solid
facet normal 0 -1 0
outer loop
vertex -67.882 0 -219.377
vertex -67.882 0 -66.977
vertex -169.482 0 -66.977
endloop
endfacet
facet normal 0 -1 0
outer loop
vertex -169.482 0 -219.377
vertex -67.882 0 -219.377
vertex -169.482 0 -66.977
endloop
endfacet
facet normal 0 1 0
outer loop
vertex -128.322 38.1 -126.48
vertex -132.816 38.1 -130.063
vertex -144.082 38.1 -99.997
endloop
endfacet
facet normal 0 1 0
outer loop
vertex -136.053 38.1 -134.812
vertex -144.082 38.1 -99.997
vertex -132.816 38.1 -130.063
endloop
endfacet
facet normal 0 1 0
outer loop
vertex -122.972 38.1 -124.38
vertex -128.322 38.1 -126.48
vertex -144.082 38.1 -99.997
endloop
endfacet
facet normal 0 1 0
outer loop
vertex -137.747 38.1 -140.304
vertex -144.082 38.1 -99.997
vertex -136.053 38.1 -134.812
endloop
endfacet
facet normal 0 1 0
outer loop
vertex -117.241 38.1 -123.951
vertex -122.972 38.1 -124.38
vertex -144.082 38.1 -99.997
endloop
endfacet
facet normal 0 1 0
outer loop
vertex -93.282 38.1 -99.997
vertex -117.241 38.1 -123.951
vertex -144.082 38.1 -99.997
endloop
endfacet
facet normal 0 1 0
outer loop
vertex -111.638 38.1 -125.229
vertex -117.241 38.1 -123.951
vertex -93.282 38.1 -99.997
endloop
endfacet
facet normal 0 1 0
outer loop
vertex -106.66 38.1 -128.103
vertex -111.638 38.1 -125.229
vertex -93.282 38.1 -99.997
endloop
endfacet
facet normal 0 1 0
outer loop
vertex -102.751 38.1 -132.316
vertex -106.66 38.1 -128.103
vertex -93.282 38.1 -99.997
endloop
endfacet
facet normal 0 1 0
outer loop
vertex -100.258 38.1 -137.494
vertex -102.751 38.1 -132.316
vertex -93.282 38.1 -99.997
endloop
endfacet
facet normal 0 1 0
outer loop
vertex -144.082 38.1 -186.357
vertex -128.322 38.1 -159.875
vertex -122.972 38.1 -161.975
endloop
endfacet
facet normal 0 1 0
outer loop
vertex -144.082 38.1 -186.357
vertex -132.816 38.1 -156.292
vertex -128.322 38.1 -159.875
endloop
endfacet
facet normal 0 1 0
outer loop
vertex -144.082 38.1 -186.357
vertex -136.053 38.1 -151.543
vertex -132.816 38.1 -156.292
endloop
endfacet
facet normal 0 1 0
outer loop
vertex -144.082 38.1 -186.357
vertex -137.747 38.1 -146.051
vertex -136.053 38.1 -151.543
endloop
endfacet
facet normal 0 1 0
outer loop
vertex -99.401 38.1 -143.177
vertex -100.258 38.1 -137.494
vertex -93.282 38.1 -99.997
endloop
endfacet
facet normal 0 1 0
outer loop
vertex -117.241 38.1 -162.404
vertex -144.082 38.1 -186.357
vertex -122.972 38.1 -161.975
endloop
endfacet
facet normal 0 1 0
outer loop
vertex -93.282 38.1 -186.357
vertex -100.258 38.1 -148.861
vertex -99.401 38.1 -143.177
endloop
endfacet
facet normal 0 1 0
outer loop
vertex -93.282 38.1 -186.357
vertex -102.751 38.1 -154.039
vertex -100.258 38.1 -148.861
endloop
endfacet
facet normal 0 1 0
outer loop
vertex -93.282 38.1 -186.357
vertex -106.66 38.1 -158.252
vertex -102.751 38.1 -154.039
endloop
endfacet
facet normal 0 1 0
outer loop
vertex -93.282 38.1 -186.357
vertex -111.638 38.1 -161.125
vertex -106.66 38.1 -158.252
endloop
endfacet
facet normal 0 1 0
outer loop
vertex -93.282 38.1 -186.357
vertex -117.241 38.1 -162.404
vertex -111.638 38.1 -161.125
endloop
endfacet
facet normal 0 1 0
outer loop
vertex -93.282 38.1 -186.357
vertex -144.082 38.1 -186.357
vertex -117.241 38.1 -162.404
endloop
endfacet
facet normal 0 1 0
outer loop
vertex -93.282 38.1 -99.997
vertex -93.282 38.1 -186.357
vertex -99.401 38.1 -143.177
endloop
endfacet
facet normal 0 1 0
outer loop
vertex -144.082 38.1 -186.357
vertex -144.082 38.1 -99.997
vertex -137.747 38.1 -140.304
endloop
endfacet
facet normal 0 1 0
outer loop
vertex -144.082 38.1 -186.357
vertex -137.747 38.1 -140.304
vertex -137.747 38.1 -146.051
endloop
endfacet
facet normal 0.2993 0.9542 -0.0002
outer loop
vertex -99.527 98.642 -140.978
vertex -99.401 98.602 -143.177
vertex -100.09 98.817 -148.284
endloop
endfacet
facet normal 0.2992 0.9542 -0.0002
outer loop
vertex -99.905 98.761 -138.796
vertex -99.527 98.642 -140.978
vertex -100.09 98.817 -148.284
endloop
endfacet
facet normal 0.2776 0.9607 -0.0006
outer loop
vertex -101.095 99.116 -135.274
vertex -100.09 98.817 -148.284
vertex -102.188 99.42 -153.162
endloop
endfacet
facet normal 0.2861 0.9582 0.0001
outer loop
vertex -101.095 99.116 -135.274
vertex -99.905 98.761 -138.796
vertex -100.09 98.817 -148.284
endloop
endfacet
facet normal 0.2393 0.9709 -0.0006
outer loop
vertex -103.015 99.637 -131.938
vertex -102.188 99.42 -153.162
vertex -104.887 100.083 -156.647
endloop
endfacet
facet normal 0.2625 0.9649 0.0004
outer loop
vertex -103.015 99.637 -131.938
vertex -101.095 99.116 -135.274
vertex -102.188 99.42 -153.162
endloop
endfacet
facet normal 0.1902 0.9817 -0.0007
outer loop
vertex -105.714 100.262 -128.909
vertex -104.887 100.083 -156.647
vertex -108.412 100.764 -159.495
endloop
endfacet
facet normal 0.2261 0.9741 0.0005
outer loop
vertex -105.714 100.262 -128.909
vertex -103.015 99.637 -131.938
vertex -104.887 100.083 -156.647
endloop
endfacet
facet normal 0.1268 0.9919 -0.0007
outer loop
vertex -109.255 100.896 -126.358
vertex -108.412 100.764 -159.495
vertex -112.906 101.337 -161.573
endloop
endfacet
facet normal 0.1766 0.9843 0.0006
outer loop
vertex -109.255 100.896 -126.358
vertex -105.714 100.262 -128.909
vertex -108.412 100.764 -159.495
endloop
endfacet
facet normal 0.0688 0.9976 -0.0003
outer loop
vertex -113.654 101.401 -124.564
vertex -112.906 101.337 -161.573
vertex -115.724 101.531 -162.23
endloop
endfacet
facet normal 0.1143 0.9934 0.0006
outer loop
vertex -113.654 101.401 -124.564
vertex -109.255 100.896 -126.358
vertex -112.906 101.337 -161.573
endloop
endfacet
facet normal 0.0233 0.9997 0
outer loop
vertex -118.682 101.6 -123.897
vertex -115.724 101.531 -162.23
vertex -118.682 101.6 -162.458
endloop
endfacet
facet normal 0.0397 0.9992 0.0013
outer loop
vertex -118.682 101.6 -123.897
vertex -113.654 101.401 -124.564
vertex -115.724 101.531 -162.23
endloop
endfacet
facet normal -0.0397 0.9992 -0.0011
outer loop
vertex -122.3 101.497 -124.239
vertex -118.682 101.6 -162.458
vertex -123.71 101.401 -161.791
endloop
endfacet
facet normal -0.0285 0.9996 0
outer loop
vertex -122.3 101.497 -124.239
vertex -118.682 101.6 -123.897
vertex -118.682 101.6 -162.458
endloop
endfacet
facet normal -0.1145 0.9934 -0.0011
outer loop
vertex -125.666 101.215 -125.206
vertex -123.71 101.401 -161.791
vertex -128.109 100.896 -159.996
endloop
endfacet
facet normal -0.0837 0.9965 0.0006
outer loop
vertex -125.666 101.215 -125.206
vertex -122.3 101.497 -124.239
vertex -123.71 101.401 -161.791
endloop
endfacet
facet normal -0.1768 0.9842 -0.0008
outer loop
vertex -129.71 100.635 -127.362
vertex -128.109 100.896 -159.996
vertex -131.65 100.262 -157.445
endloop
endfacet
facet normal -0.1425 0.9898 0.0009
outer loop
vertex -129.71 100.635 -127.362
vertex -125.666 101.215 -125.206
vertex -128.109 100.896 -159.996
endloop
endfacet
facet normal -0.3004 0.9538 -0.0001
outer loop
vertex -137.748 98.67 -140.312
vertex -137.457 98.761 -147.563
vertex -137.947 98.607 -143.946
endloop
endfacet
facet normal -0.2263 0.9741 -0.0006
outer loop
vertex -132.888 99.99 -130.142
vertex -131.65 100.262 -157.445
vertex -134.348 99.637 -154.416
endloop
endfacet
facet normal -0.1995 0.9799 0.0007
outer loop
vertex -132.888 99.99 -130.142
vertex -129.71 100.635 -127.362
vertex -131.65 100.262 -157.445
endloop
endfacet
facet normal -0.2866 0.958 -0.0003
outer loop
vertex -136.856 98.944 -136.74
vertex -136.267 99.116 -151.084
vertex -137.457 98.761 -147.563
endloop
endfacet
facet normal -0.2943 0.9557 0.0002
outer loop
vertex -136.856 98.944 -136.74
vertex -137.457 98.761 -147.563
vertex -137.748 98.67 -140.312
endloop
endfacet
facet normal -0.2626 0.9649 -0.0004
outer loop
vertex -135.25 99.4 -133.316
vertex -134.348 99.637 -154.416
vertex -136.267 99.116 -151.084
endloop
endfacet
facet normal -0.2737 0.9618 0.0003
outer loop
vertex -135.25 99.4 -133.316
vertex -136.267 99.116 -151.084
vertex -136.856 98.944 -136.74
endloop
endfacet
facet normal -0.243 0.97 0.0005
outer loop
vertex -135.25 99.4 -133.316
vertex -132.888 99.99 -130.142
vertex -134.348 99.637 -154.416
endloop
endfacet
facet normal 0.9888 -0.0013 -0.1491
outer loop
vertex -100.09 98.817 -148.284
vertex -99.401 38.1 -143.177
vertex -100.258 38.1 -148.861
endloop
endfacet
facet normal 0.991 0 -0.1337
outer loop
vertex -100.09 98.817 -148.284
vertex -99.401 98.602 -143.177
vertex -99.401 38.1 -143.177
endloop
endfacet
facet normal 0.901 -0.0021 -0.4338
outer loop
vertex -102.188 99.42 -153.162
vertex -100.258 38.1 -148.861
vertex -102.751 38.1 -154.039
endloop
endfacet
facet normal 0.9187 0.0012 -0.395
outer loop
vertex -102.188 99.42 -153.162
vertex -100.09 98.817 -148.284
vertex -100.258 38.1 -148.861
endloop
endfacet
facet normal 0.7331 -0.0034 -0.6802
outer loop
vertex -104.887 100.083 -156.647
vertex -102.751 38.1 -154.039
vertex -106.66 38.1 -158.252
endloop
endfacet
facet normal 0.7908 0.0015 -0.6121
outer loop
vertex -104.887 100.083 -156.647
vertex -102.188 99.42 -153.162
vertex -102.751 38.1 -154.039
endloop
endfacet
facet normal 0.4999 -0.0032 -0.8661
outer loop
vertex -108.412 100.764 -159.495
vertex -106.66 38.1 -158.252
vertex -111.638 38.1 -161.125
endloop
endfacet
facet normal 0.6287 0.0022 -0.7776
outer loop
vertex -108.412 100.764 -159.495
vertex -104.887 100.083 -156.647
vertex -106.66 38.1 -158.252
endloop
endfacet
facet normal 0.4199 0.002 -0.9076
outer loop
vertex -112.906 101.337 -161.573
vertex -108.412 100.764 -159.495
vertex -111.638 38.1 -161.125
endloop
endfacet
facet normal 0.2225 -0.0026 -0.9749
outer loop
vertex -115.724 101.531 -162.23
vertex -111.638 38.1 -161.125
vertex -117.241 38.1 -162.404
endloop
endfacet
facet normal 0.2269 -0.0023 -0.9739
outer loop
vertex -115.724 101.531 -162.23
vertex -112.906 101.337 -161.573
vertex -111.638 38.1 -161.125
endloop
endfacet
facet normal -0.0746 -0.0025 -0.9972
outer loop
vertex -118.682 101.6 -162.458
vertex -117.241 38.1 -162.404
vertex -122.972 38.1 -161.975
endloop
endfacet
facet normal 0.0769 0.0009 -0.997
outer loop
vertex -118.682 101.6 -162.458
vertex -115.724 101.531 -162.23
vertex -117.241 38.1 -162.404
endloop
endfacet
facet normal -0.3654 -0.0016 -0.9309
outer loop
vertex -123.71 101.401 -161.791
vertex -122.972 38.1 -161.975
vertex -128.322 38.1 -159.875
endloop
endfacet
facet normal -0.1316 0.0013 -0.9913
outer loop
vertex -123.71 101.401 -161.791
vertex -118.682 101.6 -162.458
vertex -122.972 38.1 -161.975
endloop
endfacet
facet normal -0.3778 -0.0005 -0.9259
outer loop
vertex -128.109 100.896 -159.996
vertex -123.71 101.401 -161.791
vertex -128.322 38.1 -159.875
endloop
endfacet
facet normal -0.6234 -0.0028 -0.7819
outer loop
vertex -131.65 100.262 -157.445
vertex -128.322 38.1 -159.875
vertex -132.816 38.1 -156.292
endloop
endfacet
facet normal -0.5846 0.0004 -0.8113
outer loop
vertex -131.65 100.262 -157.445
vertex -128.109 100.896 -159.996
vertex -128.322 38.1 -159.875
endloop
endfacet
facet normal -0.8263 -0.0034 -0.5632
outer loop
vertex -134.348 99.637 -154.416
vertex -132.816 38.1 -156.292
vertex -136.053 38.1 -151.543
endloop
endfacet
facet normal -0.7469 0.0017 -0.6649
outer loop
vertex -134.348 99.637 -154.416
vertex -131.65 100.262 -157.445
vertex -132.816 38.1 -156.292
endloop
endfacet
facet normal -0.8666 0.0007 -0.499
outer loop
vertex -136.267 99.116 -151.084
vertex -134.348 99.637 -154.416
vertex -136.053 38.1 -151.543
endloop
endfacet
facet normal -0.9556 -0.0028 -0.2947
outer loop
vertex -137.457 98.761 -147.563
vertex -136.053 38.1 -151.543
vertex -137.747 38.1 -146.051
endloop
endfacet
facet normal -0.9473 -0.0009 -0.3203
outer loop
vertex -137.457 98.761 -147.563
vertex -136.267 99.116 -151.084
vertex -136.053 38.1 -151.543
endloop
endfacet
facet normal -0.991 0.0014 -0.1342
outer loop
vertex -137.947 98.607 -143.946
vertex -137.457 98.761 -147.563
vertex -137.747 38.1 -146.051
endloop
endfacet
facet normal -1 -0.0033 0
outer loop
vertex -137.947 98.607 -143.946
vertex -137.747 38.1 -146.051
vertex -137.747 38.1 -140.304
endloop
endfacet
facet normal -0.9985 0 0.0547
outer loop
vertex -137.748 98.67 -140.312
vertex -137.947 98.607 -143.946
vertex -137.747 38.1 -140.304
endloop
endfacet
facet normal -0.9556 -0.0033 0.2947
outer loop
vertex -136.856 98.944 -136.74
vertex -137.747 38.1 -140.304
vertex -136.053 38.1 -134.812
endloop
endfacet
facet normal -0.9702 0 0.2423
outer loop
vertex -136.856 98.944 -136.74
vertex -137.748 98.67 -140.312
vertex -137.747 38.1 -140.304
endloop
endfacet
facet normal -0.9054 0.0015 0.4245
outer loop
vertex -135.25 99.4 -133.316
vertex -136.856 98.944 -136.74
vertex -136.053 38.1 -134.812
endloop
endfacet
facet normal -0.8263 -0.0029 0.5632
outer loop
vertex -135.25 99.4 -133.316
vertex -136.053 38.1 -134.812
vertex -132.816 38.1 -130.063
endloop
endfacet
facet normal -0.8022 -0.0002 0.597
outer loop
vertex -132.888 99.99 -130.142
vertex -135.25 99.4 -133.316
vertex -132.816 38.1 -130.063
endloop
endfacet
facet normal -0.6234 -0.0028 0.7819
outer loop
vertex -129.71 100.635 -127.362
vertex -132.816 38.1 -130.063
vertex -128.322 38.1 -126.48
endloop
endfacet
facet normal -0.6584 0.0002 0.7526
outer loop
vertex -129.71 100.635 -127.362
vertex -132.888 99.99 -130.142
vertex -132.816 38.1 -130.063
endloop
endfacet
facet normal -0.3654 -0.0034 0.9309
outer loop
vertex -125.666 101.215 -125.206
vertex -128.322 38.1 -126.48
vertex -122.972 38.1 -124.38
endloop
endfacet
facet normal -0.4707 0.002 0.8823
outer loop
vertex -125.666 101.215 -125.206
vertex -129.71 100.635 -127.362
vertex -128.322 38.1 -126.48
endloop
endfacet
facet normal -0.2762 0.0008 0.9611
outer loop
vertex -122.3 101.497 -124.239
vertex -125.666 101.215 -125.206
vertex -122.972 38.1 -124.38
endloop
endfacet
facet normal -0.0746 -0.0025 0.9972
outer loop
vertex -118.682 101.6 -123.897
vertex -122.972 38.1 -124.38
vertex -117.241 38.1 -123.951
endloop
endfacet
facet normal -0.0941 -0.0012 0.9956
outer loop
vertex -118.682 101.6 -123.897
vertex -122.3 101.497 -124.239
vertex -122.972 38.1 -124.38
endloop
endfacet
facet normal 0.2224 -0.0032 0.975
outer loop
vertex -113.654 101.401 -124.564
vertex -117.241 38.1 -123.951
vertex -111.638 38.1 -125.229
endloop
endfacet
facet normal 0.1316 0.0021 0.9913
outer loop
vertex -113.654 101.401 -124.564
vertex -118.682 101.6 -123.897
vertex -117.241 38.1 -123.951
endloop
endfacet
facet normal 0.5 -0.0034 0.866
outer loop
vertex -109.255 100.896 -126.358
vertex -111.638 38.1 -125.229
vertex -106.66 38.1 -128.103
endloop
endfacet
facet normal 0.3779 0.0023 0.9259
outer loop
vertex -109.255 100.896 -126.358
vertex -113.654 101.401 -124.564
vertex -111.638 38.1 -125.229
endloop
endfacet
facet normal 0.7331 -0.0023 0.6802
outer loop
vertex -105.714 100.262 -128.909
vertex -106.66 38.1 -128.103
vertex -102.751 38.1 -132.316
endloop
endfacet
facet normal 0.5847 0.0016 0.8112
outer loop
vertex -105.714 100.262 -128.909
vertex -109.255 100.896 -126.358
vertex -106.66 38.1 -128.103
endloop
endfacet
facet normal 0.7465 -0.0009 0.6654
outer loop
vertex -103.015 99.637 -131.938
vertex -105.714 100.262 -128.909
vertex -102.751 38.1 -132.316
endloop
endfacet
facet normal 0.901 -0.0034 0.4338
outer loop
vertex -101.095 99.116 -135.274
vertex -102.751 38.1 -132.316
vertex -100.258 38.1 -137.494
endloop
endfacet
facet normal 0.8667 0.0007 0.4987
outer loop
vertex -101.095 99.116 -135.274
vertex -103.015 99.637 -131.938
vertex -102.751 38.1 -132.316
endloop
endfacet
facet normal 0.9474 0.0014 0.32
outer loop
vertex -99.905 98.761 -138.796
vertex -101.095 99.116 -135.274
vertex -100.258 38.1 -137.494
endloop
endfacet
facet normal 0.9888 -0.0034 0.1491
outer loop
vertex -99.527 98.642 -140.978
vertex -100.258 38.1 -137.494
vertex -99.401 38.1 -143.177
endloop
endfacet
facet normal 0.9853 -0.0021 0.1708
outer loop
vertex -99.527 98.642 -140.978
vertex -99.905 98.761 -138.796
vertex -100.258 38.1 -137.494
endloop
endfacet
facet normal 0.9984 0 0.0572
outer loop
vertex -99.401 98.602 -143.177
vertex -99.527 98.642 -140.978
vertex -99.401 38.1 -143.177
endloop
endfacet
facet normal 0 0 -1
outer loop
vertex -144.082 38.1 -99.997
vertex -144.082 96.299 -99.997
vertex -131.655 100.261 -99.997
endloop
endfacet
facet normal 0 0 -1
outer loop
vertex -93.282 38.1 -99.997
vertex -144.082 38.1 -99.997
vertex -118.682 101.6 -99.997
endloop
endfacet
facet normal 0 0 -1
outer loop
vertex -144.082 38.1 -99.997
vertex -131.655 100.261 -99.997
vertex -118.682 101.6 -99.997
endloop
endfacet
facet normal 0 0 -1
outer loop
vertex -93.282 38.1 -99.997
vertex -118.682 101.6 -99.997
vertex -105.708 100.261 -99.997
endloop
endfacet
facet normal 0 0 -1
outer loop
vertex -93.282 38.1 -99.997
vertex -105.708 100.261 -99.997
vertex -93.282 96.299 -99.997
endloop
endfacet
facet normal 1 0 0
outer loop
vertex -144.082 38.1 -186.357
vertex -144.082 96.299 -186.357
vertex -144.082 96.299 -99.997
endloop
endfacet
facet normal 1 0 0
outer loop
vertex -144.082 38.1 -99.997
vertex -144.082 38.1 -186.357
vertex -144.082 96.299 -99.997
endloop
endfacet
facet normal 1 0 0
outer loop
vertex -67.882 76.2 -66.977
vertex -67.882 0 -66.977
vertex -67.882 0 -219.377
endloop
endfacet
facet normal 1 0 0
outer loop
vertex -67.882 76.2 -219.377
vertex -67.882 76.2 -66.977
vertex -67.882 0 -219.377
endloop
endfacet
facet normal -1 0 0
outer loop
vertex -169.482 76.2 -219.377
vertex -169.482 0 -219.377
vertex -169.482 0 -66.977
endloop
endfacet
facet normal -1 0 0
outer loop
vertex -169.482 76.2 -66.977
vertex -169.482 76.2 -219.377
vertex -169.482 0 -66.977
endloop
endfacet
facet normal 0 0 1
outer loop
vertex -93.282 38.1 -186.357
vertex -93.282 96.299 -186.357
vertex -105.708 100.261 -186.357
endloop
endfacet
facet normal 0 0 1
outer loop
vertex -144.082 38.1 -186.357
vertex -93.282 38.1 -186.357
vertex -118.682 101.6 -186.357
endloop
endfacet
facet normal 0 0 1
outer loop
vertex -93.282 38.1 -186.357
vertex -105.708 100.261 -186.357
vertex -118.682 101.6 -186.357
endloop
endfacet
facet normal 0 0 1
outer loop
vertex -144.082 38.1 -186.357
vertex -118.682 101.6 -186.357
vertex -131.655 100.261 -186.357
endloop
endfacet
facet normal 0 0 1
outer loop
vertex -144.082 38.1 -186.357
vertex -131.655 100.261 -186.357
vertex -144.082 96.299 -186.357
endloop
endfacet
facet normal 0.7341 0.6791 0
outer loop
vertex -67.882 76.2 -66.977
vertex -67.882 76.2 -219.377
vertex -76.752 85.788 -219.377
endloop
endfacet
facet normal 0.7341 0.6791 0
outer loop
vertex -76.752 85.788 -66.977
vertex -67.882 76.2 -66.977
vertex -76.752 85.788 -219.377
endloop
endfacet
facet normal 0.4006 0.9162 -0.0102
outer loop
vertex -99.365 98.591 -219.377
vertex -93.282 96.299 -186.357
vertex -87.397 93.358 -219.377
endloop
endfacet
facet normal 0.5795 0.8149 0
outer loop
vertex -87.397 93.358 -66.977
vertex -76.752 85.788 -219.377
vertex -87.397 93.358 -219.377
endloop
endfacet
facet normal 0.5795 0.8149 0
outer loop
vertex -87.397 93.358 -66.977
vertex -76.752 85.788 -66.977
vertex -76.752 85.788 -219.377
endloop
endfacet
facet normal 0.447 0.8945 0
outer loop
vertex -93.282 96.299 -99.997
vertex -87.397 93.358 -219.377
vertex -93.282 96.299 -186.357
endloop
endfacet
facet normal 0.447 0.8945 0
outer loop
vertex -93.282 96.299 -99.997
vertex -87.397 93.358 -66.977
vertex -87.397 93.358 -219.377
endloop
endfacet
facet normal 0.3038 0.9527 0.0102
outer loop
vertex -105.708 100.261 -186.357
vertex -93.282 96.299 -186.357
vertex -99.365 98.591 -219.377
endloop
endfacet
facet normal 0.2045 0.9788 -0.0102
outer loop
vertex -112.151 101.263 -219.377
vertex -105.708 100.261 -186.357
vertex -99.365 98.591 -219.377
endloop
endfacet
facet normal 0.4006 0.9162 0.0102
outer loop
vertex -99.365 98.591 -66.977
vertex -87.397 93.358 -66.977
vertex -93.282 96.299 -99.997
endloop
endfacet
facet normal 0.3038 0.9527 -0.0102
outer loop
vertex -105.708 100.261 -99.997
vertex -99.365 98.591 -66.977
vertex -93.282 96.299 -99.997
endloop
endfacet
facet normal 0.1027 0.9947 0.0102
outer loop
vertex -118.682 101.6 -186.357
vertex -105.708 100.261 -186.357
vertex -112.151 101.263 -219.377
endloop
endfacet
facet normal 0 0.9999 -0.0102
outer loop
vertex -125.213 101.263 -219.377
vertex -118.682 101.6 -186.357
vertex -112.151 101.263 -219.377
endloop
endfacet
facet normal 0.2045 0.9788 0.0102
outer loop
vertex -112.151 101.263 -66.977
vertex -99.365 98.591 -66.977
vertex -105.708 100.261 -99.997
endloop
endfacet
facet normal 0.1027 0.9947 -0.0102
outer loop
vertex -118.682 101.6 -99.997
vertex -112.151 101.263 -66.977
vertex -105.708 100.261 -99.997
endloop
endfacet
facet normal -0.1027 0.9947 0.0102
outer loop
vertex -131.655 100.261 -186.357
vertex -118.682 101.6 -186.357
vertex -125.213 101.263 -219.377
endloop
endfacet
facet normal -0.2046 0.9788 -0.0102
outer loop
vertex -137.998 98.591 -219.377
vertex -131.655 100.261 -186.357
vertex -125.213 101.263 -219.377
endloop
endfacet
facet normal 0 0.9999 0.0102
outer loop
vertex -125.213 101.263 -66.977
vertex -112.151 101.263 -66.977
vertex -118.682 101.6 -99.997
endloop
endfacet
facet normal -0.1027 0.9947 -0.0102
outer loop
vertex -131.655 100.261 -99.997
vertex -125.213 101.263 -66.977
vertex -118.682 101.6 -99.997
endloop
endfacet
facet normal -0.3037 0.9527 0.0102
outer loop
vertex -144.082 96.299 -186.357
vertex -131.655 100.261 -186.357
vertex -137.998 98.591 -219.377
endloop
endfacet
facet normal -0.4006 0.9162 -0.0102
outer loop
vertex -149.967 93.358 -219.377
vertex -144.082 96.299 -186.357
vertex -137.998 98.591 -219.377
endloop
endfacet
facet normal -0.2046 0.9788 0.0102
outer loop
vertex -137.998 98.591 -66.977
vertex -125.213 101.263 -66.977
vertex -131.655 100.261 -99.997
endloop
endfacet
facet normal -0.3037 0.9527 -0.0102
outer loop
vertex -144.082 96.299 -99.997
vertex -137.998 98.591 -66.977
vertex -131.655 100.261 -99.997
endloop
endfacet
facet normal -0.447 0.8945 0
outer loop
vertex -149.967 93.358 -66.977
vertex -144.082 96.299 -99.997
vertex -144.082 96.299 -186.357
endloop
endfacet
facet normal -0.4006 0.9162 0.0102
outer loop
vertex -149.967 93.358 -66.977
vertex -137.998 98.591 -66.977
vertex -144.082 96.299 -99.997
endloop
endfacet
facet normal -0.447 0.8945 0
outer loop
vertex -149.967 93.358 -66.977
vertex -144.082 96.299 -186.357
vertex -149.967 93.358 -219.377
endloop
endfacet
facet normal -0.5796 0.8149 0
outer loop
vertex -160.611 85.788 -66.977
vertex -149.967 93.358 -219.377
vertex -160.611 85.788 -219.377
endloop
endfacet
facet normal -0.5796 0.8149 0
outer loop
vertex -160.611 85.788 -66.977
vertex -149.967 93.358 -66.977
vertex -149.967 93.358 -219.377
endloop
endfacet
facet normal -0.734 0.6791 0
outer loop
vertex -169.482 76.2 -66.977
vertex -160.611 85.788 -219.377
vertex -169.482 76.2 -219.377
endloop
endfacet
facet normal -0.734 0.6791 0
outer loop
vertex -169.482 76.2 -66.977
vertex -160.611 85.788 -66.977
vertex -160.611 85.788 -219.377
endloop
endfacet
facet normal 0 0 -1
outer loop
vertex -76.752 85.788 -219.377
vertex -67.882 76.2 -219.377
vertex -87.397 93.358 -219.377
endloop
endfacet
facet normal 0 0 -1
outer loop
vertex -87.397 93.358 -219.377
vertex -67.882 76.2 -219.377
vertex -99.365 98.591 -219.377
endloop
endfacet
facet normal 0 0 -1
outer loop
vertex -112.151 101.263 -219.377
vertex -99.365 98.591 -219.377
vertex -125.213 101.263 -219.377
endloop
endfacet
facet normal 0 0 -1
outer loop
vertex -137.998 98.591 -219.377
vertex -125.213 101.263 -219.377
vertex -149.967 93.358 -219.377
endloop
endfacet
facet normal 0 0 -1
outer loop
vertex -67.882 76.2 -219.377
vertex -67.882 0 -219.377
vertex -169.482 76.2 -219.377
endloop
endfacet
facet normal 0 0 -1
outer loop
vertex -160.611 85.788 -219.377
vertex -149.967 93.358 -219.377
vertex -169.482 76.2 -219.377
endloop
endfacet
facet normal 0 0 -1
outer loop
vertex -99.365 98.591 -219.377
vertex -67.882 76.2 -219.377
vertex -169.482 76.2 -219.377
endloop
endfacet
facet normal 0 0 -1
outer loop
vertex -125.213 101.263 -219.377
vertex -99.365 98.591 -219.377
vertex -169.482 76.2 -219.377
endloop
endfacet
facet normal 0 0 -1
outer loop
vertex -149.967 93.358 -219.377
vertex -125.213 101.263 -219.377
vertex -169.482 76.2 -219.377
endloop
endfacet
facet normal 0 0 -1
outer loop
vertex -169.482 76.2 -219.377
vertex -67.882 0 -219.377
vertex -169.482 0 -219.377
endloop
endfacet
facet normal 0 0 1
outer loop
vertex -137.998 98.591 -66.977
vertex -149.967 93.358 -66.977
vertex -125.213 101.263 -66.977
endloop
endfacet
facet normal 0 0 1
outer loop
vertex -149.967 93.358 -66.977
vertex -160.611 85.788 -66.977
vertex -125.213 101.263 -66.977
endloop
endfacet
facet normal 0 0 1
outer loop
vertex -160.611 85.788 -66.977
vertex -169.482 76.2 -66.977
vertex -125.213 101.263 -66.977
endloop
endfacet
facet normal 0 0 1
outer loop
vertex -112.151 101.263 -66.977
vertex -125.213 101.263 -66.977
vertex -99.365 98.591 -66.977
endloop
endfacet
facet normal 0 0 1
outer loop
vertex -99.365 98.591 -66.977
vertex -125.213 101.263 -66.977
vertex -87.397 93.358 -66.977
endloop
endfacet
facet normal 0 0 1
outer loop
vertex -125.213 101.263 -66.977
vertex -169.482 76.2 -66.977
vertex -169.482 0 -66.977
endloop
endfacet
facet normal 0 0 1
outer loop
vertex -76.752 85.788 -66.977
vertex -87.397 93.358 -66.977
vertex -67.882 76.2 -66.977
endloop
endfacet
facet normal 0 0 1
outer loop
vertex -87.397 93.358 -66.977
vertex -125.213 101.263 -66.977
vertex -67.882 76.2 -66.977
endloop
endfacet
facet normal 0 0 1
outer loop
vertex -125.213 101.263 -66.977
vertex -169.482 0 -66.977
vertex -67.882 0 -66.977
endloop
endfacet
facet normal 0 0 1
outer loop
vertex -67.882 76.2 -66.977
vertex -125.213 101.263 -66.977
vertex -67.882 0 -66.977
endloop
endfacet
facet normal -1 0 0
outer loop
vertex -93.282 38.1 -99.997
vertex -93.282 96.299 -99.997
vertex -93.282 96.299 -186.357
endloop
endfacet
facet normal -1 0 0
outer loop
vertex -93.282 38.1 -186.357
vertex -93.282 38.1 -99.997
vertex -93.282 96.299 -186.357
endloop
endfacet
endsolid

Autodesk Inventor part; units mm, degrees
ref_plane "YZ Plane" through (0, 0, 0) normal (1, 0, 0) x (0, 1, 0)
ref_plane "XZ Plane" through (0, 0, 0) normal (0, 1, 0) x (-1, 0, 0)
ref_plane "XY Plane" through (0, 0, 0) normal (0, 0, 1) x (1, 0, 0)
sketch "Sketch1" plane through (0, 0, 0) normal (0, 1, 0) x (-1, 0, 0)
  line L0 (169.4818, -66.9774) -> (67.8818, -66.9774)
  line L1 (67.8818, -66.9774) -> (67.8818, -219.3774)
  line L2 (67.8818, -219.3774) -> (169.4818, -219.3774)
  line L3 (169.4818, -219.3774) -> (169.4818, -66.9774)
  point P0 (0, 0)
  dimension "d0" = 152.4
  dimension "d1" = 101.6
extrude "Extrusion1" add sketch "Sketch1" along normal blind 101.6
sketch "Sketch2" plane through (0, 101.6, 0) normal (0, 1, 0) x (1, 0, 0)
  line L0 (-144.0818, 99.9974) -> (-93.2818, 99.9974)
  line L1 (-93.2818, 99.9974) -> (-93.2818, 186.3574)
  line L2 (-93.2818, 186.3574) -> (-144.0818, 186.3574)
  line L3 (-144.0818, 186.3574) -> (-144.0818, 99.9974)
  circle A0 centre (-118.6818, 143.1774) radius 19.2808
  line L4 (-67.8818, 219.3774) -> (-169.4818, 219.3774) projected
  line L5 (-169.4818, 66.9774) -> (-67.8818, 66.9774) projected
  line L6 (-169.4818, 219.3774) -> (-169.4818, 66.9774) projected
  line L7 (-67.8818, 66.9774) -> (-67.8818, 219.3774) projected
  point P0 (0, 0)
  dimension "d4" = 33.02
  dimension "d5" = 33.02
  dimension "d6" = 76.2
  dimension "d7" = 50.8
  dimension "d8" = 25.4
  dimension "d9" = 25.4
extrude "Extrusion2" cut sketch "Sketch2" against normal blind 63.5 contours L3 L2 L1 L0
sketch "Sketch3" plane through (-169.4818, 0, -66.9774) normal (0, 0, 1) x (1, 0, 0)
  line L0 (101.6, 0) -> (0, 0) projected
  arc A0 (101.6, 0) -> (0, 0) centre (50.8, 38.1) ccw
  line L1 (76.2, 101.6) -> (25.4, 101.6) projected
  point P0 (169.4818, 0)
extrude "Extrusion3" cut sketch "Sketch3" against normal up to surface (152.4 mm away) keep common part
properties part number "complex extrusion 1 5.7.20"
